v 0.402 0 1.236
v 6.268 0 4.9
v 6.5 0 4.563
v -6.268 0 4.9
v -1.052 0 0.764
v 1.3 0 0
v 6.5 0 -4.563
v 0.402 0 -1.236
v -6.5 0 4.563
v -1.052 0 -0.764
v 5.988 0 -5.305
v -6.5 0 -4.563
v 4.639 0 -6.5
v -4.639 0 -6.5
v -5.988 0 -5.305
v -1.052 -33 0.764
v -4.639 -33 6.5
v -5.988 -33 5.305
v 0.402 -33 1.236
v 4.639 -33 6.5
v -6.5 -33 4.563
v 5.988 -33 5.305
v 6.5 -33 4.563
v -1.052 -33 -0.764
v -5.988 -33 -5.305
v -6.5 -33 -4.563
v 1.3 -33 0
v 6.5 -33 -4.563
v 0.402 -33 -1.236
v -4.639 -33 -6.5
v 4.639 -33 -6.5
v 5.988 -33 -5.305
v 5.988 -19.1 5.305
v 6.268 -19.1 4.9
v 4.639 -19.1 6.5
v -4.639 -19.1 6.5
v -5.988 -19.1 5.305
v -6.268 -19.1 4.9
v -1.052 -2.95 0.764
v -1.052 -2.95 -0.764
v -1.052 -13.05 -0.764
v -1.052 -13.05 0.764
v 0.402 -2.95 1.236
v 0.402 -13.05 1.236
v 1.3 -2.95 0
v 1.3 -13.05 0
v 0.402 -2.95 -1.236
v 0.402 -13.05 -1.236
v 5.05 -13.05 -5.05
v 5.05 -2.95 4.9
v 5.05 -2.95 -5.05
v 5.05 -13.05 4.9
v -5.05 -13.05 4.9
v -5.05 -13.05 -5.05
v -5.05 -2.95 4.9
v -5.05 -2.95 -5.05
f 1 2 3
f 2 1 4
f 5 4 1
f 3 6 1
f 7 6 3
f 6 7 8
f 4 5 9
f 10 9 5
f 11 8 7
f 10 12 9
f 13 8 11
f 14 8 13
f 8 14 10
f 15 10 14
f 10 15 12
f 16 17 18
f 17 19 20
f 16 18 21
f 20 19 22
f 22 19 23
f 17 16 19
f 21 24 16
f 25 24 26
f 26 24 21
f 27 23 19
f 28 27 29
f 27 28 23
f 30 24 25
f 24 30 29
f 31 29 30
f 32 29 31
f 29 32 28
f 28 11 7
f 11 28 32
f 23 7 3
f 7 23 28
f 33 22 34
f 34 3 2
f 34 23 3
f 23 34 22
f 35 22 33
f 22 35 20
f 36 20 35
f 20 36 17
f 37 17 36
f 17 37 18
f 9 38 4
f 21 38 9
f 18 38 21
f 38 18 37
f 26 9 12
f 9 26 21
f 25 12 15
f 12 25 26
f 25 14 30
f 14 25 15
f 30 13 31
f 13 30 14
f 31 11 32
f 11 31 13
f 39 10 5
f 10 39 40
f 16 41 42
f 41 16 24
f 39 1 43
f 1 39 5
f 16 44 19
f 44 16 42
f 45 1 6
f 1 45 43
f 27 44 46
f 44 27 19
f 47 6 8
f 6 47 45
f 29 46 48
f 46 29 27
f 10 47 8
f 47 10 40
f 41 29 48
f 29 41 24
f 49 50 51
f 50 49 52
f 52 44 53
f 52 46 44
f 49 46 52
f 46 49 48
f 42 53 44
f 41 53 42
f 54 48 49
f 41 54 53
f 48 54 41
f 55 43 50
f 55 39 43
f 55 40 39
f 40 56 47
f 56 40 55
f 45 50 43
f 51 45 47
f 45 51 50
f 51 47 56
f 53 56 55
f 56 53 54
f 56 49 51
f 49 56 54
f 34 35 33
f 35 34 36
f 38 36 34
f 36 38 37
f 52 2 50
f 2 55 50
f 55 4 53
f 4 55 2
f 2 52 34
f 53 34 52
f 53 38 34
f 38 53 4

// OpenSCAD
//
//  Copyright (C) 09-06-2013 Jasper den Ouden.
//
//  This is free software: you can redistribute it and/or modify
//  it under the terms of the GNU General Public License as published
//  by the Free Software Foundation, either version 3 of the License, or
//  (at your option) any later version.
//

//Thing to fix the prusa mendel bed. Make sure the head doesnt hit it sideways!
// I suggest you move the endstops to help.
// (And make sure the firmware limitations arent too wide)
//The z-rods have spring in them that might help with collisions a lot too.

sr=1.3;

t=3;
d=20;
w=10;
et=0.1;
st = 6;

module bed_fixer()
{
    difference()
    {   linear_extrude(height=t + w + d) intersection()
        {   difference(){ circle(w/2+t); circle(sr); }
            square([w+t,w+t], center=true);
        }
        translate([0,0,t+w/2]) cube((w+et)*[1,1,1], center=true);
        translate([0,w/2-et+2*d,t+w+st+et-2*d]) cube(4*[d,d,d],center=true);
    }
    
}

rotate([90,0,0]) bed_fixer();
